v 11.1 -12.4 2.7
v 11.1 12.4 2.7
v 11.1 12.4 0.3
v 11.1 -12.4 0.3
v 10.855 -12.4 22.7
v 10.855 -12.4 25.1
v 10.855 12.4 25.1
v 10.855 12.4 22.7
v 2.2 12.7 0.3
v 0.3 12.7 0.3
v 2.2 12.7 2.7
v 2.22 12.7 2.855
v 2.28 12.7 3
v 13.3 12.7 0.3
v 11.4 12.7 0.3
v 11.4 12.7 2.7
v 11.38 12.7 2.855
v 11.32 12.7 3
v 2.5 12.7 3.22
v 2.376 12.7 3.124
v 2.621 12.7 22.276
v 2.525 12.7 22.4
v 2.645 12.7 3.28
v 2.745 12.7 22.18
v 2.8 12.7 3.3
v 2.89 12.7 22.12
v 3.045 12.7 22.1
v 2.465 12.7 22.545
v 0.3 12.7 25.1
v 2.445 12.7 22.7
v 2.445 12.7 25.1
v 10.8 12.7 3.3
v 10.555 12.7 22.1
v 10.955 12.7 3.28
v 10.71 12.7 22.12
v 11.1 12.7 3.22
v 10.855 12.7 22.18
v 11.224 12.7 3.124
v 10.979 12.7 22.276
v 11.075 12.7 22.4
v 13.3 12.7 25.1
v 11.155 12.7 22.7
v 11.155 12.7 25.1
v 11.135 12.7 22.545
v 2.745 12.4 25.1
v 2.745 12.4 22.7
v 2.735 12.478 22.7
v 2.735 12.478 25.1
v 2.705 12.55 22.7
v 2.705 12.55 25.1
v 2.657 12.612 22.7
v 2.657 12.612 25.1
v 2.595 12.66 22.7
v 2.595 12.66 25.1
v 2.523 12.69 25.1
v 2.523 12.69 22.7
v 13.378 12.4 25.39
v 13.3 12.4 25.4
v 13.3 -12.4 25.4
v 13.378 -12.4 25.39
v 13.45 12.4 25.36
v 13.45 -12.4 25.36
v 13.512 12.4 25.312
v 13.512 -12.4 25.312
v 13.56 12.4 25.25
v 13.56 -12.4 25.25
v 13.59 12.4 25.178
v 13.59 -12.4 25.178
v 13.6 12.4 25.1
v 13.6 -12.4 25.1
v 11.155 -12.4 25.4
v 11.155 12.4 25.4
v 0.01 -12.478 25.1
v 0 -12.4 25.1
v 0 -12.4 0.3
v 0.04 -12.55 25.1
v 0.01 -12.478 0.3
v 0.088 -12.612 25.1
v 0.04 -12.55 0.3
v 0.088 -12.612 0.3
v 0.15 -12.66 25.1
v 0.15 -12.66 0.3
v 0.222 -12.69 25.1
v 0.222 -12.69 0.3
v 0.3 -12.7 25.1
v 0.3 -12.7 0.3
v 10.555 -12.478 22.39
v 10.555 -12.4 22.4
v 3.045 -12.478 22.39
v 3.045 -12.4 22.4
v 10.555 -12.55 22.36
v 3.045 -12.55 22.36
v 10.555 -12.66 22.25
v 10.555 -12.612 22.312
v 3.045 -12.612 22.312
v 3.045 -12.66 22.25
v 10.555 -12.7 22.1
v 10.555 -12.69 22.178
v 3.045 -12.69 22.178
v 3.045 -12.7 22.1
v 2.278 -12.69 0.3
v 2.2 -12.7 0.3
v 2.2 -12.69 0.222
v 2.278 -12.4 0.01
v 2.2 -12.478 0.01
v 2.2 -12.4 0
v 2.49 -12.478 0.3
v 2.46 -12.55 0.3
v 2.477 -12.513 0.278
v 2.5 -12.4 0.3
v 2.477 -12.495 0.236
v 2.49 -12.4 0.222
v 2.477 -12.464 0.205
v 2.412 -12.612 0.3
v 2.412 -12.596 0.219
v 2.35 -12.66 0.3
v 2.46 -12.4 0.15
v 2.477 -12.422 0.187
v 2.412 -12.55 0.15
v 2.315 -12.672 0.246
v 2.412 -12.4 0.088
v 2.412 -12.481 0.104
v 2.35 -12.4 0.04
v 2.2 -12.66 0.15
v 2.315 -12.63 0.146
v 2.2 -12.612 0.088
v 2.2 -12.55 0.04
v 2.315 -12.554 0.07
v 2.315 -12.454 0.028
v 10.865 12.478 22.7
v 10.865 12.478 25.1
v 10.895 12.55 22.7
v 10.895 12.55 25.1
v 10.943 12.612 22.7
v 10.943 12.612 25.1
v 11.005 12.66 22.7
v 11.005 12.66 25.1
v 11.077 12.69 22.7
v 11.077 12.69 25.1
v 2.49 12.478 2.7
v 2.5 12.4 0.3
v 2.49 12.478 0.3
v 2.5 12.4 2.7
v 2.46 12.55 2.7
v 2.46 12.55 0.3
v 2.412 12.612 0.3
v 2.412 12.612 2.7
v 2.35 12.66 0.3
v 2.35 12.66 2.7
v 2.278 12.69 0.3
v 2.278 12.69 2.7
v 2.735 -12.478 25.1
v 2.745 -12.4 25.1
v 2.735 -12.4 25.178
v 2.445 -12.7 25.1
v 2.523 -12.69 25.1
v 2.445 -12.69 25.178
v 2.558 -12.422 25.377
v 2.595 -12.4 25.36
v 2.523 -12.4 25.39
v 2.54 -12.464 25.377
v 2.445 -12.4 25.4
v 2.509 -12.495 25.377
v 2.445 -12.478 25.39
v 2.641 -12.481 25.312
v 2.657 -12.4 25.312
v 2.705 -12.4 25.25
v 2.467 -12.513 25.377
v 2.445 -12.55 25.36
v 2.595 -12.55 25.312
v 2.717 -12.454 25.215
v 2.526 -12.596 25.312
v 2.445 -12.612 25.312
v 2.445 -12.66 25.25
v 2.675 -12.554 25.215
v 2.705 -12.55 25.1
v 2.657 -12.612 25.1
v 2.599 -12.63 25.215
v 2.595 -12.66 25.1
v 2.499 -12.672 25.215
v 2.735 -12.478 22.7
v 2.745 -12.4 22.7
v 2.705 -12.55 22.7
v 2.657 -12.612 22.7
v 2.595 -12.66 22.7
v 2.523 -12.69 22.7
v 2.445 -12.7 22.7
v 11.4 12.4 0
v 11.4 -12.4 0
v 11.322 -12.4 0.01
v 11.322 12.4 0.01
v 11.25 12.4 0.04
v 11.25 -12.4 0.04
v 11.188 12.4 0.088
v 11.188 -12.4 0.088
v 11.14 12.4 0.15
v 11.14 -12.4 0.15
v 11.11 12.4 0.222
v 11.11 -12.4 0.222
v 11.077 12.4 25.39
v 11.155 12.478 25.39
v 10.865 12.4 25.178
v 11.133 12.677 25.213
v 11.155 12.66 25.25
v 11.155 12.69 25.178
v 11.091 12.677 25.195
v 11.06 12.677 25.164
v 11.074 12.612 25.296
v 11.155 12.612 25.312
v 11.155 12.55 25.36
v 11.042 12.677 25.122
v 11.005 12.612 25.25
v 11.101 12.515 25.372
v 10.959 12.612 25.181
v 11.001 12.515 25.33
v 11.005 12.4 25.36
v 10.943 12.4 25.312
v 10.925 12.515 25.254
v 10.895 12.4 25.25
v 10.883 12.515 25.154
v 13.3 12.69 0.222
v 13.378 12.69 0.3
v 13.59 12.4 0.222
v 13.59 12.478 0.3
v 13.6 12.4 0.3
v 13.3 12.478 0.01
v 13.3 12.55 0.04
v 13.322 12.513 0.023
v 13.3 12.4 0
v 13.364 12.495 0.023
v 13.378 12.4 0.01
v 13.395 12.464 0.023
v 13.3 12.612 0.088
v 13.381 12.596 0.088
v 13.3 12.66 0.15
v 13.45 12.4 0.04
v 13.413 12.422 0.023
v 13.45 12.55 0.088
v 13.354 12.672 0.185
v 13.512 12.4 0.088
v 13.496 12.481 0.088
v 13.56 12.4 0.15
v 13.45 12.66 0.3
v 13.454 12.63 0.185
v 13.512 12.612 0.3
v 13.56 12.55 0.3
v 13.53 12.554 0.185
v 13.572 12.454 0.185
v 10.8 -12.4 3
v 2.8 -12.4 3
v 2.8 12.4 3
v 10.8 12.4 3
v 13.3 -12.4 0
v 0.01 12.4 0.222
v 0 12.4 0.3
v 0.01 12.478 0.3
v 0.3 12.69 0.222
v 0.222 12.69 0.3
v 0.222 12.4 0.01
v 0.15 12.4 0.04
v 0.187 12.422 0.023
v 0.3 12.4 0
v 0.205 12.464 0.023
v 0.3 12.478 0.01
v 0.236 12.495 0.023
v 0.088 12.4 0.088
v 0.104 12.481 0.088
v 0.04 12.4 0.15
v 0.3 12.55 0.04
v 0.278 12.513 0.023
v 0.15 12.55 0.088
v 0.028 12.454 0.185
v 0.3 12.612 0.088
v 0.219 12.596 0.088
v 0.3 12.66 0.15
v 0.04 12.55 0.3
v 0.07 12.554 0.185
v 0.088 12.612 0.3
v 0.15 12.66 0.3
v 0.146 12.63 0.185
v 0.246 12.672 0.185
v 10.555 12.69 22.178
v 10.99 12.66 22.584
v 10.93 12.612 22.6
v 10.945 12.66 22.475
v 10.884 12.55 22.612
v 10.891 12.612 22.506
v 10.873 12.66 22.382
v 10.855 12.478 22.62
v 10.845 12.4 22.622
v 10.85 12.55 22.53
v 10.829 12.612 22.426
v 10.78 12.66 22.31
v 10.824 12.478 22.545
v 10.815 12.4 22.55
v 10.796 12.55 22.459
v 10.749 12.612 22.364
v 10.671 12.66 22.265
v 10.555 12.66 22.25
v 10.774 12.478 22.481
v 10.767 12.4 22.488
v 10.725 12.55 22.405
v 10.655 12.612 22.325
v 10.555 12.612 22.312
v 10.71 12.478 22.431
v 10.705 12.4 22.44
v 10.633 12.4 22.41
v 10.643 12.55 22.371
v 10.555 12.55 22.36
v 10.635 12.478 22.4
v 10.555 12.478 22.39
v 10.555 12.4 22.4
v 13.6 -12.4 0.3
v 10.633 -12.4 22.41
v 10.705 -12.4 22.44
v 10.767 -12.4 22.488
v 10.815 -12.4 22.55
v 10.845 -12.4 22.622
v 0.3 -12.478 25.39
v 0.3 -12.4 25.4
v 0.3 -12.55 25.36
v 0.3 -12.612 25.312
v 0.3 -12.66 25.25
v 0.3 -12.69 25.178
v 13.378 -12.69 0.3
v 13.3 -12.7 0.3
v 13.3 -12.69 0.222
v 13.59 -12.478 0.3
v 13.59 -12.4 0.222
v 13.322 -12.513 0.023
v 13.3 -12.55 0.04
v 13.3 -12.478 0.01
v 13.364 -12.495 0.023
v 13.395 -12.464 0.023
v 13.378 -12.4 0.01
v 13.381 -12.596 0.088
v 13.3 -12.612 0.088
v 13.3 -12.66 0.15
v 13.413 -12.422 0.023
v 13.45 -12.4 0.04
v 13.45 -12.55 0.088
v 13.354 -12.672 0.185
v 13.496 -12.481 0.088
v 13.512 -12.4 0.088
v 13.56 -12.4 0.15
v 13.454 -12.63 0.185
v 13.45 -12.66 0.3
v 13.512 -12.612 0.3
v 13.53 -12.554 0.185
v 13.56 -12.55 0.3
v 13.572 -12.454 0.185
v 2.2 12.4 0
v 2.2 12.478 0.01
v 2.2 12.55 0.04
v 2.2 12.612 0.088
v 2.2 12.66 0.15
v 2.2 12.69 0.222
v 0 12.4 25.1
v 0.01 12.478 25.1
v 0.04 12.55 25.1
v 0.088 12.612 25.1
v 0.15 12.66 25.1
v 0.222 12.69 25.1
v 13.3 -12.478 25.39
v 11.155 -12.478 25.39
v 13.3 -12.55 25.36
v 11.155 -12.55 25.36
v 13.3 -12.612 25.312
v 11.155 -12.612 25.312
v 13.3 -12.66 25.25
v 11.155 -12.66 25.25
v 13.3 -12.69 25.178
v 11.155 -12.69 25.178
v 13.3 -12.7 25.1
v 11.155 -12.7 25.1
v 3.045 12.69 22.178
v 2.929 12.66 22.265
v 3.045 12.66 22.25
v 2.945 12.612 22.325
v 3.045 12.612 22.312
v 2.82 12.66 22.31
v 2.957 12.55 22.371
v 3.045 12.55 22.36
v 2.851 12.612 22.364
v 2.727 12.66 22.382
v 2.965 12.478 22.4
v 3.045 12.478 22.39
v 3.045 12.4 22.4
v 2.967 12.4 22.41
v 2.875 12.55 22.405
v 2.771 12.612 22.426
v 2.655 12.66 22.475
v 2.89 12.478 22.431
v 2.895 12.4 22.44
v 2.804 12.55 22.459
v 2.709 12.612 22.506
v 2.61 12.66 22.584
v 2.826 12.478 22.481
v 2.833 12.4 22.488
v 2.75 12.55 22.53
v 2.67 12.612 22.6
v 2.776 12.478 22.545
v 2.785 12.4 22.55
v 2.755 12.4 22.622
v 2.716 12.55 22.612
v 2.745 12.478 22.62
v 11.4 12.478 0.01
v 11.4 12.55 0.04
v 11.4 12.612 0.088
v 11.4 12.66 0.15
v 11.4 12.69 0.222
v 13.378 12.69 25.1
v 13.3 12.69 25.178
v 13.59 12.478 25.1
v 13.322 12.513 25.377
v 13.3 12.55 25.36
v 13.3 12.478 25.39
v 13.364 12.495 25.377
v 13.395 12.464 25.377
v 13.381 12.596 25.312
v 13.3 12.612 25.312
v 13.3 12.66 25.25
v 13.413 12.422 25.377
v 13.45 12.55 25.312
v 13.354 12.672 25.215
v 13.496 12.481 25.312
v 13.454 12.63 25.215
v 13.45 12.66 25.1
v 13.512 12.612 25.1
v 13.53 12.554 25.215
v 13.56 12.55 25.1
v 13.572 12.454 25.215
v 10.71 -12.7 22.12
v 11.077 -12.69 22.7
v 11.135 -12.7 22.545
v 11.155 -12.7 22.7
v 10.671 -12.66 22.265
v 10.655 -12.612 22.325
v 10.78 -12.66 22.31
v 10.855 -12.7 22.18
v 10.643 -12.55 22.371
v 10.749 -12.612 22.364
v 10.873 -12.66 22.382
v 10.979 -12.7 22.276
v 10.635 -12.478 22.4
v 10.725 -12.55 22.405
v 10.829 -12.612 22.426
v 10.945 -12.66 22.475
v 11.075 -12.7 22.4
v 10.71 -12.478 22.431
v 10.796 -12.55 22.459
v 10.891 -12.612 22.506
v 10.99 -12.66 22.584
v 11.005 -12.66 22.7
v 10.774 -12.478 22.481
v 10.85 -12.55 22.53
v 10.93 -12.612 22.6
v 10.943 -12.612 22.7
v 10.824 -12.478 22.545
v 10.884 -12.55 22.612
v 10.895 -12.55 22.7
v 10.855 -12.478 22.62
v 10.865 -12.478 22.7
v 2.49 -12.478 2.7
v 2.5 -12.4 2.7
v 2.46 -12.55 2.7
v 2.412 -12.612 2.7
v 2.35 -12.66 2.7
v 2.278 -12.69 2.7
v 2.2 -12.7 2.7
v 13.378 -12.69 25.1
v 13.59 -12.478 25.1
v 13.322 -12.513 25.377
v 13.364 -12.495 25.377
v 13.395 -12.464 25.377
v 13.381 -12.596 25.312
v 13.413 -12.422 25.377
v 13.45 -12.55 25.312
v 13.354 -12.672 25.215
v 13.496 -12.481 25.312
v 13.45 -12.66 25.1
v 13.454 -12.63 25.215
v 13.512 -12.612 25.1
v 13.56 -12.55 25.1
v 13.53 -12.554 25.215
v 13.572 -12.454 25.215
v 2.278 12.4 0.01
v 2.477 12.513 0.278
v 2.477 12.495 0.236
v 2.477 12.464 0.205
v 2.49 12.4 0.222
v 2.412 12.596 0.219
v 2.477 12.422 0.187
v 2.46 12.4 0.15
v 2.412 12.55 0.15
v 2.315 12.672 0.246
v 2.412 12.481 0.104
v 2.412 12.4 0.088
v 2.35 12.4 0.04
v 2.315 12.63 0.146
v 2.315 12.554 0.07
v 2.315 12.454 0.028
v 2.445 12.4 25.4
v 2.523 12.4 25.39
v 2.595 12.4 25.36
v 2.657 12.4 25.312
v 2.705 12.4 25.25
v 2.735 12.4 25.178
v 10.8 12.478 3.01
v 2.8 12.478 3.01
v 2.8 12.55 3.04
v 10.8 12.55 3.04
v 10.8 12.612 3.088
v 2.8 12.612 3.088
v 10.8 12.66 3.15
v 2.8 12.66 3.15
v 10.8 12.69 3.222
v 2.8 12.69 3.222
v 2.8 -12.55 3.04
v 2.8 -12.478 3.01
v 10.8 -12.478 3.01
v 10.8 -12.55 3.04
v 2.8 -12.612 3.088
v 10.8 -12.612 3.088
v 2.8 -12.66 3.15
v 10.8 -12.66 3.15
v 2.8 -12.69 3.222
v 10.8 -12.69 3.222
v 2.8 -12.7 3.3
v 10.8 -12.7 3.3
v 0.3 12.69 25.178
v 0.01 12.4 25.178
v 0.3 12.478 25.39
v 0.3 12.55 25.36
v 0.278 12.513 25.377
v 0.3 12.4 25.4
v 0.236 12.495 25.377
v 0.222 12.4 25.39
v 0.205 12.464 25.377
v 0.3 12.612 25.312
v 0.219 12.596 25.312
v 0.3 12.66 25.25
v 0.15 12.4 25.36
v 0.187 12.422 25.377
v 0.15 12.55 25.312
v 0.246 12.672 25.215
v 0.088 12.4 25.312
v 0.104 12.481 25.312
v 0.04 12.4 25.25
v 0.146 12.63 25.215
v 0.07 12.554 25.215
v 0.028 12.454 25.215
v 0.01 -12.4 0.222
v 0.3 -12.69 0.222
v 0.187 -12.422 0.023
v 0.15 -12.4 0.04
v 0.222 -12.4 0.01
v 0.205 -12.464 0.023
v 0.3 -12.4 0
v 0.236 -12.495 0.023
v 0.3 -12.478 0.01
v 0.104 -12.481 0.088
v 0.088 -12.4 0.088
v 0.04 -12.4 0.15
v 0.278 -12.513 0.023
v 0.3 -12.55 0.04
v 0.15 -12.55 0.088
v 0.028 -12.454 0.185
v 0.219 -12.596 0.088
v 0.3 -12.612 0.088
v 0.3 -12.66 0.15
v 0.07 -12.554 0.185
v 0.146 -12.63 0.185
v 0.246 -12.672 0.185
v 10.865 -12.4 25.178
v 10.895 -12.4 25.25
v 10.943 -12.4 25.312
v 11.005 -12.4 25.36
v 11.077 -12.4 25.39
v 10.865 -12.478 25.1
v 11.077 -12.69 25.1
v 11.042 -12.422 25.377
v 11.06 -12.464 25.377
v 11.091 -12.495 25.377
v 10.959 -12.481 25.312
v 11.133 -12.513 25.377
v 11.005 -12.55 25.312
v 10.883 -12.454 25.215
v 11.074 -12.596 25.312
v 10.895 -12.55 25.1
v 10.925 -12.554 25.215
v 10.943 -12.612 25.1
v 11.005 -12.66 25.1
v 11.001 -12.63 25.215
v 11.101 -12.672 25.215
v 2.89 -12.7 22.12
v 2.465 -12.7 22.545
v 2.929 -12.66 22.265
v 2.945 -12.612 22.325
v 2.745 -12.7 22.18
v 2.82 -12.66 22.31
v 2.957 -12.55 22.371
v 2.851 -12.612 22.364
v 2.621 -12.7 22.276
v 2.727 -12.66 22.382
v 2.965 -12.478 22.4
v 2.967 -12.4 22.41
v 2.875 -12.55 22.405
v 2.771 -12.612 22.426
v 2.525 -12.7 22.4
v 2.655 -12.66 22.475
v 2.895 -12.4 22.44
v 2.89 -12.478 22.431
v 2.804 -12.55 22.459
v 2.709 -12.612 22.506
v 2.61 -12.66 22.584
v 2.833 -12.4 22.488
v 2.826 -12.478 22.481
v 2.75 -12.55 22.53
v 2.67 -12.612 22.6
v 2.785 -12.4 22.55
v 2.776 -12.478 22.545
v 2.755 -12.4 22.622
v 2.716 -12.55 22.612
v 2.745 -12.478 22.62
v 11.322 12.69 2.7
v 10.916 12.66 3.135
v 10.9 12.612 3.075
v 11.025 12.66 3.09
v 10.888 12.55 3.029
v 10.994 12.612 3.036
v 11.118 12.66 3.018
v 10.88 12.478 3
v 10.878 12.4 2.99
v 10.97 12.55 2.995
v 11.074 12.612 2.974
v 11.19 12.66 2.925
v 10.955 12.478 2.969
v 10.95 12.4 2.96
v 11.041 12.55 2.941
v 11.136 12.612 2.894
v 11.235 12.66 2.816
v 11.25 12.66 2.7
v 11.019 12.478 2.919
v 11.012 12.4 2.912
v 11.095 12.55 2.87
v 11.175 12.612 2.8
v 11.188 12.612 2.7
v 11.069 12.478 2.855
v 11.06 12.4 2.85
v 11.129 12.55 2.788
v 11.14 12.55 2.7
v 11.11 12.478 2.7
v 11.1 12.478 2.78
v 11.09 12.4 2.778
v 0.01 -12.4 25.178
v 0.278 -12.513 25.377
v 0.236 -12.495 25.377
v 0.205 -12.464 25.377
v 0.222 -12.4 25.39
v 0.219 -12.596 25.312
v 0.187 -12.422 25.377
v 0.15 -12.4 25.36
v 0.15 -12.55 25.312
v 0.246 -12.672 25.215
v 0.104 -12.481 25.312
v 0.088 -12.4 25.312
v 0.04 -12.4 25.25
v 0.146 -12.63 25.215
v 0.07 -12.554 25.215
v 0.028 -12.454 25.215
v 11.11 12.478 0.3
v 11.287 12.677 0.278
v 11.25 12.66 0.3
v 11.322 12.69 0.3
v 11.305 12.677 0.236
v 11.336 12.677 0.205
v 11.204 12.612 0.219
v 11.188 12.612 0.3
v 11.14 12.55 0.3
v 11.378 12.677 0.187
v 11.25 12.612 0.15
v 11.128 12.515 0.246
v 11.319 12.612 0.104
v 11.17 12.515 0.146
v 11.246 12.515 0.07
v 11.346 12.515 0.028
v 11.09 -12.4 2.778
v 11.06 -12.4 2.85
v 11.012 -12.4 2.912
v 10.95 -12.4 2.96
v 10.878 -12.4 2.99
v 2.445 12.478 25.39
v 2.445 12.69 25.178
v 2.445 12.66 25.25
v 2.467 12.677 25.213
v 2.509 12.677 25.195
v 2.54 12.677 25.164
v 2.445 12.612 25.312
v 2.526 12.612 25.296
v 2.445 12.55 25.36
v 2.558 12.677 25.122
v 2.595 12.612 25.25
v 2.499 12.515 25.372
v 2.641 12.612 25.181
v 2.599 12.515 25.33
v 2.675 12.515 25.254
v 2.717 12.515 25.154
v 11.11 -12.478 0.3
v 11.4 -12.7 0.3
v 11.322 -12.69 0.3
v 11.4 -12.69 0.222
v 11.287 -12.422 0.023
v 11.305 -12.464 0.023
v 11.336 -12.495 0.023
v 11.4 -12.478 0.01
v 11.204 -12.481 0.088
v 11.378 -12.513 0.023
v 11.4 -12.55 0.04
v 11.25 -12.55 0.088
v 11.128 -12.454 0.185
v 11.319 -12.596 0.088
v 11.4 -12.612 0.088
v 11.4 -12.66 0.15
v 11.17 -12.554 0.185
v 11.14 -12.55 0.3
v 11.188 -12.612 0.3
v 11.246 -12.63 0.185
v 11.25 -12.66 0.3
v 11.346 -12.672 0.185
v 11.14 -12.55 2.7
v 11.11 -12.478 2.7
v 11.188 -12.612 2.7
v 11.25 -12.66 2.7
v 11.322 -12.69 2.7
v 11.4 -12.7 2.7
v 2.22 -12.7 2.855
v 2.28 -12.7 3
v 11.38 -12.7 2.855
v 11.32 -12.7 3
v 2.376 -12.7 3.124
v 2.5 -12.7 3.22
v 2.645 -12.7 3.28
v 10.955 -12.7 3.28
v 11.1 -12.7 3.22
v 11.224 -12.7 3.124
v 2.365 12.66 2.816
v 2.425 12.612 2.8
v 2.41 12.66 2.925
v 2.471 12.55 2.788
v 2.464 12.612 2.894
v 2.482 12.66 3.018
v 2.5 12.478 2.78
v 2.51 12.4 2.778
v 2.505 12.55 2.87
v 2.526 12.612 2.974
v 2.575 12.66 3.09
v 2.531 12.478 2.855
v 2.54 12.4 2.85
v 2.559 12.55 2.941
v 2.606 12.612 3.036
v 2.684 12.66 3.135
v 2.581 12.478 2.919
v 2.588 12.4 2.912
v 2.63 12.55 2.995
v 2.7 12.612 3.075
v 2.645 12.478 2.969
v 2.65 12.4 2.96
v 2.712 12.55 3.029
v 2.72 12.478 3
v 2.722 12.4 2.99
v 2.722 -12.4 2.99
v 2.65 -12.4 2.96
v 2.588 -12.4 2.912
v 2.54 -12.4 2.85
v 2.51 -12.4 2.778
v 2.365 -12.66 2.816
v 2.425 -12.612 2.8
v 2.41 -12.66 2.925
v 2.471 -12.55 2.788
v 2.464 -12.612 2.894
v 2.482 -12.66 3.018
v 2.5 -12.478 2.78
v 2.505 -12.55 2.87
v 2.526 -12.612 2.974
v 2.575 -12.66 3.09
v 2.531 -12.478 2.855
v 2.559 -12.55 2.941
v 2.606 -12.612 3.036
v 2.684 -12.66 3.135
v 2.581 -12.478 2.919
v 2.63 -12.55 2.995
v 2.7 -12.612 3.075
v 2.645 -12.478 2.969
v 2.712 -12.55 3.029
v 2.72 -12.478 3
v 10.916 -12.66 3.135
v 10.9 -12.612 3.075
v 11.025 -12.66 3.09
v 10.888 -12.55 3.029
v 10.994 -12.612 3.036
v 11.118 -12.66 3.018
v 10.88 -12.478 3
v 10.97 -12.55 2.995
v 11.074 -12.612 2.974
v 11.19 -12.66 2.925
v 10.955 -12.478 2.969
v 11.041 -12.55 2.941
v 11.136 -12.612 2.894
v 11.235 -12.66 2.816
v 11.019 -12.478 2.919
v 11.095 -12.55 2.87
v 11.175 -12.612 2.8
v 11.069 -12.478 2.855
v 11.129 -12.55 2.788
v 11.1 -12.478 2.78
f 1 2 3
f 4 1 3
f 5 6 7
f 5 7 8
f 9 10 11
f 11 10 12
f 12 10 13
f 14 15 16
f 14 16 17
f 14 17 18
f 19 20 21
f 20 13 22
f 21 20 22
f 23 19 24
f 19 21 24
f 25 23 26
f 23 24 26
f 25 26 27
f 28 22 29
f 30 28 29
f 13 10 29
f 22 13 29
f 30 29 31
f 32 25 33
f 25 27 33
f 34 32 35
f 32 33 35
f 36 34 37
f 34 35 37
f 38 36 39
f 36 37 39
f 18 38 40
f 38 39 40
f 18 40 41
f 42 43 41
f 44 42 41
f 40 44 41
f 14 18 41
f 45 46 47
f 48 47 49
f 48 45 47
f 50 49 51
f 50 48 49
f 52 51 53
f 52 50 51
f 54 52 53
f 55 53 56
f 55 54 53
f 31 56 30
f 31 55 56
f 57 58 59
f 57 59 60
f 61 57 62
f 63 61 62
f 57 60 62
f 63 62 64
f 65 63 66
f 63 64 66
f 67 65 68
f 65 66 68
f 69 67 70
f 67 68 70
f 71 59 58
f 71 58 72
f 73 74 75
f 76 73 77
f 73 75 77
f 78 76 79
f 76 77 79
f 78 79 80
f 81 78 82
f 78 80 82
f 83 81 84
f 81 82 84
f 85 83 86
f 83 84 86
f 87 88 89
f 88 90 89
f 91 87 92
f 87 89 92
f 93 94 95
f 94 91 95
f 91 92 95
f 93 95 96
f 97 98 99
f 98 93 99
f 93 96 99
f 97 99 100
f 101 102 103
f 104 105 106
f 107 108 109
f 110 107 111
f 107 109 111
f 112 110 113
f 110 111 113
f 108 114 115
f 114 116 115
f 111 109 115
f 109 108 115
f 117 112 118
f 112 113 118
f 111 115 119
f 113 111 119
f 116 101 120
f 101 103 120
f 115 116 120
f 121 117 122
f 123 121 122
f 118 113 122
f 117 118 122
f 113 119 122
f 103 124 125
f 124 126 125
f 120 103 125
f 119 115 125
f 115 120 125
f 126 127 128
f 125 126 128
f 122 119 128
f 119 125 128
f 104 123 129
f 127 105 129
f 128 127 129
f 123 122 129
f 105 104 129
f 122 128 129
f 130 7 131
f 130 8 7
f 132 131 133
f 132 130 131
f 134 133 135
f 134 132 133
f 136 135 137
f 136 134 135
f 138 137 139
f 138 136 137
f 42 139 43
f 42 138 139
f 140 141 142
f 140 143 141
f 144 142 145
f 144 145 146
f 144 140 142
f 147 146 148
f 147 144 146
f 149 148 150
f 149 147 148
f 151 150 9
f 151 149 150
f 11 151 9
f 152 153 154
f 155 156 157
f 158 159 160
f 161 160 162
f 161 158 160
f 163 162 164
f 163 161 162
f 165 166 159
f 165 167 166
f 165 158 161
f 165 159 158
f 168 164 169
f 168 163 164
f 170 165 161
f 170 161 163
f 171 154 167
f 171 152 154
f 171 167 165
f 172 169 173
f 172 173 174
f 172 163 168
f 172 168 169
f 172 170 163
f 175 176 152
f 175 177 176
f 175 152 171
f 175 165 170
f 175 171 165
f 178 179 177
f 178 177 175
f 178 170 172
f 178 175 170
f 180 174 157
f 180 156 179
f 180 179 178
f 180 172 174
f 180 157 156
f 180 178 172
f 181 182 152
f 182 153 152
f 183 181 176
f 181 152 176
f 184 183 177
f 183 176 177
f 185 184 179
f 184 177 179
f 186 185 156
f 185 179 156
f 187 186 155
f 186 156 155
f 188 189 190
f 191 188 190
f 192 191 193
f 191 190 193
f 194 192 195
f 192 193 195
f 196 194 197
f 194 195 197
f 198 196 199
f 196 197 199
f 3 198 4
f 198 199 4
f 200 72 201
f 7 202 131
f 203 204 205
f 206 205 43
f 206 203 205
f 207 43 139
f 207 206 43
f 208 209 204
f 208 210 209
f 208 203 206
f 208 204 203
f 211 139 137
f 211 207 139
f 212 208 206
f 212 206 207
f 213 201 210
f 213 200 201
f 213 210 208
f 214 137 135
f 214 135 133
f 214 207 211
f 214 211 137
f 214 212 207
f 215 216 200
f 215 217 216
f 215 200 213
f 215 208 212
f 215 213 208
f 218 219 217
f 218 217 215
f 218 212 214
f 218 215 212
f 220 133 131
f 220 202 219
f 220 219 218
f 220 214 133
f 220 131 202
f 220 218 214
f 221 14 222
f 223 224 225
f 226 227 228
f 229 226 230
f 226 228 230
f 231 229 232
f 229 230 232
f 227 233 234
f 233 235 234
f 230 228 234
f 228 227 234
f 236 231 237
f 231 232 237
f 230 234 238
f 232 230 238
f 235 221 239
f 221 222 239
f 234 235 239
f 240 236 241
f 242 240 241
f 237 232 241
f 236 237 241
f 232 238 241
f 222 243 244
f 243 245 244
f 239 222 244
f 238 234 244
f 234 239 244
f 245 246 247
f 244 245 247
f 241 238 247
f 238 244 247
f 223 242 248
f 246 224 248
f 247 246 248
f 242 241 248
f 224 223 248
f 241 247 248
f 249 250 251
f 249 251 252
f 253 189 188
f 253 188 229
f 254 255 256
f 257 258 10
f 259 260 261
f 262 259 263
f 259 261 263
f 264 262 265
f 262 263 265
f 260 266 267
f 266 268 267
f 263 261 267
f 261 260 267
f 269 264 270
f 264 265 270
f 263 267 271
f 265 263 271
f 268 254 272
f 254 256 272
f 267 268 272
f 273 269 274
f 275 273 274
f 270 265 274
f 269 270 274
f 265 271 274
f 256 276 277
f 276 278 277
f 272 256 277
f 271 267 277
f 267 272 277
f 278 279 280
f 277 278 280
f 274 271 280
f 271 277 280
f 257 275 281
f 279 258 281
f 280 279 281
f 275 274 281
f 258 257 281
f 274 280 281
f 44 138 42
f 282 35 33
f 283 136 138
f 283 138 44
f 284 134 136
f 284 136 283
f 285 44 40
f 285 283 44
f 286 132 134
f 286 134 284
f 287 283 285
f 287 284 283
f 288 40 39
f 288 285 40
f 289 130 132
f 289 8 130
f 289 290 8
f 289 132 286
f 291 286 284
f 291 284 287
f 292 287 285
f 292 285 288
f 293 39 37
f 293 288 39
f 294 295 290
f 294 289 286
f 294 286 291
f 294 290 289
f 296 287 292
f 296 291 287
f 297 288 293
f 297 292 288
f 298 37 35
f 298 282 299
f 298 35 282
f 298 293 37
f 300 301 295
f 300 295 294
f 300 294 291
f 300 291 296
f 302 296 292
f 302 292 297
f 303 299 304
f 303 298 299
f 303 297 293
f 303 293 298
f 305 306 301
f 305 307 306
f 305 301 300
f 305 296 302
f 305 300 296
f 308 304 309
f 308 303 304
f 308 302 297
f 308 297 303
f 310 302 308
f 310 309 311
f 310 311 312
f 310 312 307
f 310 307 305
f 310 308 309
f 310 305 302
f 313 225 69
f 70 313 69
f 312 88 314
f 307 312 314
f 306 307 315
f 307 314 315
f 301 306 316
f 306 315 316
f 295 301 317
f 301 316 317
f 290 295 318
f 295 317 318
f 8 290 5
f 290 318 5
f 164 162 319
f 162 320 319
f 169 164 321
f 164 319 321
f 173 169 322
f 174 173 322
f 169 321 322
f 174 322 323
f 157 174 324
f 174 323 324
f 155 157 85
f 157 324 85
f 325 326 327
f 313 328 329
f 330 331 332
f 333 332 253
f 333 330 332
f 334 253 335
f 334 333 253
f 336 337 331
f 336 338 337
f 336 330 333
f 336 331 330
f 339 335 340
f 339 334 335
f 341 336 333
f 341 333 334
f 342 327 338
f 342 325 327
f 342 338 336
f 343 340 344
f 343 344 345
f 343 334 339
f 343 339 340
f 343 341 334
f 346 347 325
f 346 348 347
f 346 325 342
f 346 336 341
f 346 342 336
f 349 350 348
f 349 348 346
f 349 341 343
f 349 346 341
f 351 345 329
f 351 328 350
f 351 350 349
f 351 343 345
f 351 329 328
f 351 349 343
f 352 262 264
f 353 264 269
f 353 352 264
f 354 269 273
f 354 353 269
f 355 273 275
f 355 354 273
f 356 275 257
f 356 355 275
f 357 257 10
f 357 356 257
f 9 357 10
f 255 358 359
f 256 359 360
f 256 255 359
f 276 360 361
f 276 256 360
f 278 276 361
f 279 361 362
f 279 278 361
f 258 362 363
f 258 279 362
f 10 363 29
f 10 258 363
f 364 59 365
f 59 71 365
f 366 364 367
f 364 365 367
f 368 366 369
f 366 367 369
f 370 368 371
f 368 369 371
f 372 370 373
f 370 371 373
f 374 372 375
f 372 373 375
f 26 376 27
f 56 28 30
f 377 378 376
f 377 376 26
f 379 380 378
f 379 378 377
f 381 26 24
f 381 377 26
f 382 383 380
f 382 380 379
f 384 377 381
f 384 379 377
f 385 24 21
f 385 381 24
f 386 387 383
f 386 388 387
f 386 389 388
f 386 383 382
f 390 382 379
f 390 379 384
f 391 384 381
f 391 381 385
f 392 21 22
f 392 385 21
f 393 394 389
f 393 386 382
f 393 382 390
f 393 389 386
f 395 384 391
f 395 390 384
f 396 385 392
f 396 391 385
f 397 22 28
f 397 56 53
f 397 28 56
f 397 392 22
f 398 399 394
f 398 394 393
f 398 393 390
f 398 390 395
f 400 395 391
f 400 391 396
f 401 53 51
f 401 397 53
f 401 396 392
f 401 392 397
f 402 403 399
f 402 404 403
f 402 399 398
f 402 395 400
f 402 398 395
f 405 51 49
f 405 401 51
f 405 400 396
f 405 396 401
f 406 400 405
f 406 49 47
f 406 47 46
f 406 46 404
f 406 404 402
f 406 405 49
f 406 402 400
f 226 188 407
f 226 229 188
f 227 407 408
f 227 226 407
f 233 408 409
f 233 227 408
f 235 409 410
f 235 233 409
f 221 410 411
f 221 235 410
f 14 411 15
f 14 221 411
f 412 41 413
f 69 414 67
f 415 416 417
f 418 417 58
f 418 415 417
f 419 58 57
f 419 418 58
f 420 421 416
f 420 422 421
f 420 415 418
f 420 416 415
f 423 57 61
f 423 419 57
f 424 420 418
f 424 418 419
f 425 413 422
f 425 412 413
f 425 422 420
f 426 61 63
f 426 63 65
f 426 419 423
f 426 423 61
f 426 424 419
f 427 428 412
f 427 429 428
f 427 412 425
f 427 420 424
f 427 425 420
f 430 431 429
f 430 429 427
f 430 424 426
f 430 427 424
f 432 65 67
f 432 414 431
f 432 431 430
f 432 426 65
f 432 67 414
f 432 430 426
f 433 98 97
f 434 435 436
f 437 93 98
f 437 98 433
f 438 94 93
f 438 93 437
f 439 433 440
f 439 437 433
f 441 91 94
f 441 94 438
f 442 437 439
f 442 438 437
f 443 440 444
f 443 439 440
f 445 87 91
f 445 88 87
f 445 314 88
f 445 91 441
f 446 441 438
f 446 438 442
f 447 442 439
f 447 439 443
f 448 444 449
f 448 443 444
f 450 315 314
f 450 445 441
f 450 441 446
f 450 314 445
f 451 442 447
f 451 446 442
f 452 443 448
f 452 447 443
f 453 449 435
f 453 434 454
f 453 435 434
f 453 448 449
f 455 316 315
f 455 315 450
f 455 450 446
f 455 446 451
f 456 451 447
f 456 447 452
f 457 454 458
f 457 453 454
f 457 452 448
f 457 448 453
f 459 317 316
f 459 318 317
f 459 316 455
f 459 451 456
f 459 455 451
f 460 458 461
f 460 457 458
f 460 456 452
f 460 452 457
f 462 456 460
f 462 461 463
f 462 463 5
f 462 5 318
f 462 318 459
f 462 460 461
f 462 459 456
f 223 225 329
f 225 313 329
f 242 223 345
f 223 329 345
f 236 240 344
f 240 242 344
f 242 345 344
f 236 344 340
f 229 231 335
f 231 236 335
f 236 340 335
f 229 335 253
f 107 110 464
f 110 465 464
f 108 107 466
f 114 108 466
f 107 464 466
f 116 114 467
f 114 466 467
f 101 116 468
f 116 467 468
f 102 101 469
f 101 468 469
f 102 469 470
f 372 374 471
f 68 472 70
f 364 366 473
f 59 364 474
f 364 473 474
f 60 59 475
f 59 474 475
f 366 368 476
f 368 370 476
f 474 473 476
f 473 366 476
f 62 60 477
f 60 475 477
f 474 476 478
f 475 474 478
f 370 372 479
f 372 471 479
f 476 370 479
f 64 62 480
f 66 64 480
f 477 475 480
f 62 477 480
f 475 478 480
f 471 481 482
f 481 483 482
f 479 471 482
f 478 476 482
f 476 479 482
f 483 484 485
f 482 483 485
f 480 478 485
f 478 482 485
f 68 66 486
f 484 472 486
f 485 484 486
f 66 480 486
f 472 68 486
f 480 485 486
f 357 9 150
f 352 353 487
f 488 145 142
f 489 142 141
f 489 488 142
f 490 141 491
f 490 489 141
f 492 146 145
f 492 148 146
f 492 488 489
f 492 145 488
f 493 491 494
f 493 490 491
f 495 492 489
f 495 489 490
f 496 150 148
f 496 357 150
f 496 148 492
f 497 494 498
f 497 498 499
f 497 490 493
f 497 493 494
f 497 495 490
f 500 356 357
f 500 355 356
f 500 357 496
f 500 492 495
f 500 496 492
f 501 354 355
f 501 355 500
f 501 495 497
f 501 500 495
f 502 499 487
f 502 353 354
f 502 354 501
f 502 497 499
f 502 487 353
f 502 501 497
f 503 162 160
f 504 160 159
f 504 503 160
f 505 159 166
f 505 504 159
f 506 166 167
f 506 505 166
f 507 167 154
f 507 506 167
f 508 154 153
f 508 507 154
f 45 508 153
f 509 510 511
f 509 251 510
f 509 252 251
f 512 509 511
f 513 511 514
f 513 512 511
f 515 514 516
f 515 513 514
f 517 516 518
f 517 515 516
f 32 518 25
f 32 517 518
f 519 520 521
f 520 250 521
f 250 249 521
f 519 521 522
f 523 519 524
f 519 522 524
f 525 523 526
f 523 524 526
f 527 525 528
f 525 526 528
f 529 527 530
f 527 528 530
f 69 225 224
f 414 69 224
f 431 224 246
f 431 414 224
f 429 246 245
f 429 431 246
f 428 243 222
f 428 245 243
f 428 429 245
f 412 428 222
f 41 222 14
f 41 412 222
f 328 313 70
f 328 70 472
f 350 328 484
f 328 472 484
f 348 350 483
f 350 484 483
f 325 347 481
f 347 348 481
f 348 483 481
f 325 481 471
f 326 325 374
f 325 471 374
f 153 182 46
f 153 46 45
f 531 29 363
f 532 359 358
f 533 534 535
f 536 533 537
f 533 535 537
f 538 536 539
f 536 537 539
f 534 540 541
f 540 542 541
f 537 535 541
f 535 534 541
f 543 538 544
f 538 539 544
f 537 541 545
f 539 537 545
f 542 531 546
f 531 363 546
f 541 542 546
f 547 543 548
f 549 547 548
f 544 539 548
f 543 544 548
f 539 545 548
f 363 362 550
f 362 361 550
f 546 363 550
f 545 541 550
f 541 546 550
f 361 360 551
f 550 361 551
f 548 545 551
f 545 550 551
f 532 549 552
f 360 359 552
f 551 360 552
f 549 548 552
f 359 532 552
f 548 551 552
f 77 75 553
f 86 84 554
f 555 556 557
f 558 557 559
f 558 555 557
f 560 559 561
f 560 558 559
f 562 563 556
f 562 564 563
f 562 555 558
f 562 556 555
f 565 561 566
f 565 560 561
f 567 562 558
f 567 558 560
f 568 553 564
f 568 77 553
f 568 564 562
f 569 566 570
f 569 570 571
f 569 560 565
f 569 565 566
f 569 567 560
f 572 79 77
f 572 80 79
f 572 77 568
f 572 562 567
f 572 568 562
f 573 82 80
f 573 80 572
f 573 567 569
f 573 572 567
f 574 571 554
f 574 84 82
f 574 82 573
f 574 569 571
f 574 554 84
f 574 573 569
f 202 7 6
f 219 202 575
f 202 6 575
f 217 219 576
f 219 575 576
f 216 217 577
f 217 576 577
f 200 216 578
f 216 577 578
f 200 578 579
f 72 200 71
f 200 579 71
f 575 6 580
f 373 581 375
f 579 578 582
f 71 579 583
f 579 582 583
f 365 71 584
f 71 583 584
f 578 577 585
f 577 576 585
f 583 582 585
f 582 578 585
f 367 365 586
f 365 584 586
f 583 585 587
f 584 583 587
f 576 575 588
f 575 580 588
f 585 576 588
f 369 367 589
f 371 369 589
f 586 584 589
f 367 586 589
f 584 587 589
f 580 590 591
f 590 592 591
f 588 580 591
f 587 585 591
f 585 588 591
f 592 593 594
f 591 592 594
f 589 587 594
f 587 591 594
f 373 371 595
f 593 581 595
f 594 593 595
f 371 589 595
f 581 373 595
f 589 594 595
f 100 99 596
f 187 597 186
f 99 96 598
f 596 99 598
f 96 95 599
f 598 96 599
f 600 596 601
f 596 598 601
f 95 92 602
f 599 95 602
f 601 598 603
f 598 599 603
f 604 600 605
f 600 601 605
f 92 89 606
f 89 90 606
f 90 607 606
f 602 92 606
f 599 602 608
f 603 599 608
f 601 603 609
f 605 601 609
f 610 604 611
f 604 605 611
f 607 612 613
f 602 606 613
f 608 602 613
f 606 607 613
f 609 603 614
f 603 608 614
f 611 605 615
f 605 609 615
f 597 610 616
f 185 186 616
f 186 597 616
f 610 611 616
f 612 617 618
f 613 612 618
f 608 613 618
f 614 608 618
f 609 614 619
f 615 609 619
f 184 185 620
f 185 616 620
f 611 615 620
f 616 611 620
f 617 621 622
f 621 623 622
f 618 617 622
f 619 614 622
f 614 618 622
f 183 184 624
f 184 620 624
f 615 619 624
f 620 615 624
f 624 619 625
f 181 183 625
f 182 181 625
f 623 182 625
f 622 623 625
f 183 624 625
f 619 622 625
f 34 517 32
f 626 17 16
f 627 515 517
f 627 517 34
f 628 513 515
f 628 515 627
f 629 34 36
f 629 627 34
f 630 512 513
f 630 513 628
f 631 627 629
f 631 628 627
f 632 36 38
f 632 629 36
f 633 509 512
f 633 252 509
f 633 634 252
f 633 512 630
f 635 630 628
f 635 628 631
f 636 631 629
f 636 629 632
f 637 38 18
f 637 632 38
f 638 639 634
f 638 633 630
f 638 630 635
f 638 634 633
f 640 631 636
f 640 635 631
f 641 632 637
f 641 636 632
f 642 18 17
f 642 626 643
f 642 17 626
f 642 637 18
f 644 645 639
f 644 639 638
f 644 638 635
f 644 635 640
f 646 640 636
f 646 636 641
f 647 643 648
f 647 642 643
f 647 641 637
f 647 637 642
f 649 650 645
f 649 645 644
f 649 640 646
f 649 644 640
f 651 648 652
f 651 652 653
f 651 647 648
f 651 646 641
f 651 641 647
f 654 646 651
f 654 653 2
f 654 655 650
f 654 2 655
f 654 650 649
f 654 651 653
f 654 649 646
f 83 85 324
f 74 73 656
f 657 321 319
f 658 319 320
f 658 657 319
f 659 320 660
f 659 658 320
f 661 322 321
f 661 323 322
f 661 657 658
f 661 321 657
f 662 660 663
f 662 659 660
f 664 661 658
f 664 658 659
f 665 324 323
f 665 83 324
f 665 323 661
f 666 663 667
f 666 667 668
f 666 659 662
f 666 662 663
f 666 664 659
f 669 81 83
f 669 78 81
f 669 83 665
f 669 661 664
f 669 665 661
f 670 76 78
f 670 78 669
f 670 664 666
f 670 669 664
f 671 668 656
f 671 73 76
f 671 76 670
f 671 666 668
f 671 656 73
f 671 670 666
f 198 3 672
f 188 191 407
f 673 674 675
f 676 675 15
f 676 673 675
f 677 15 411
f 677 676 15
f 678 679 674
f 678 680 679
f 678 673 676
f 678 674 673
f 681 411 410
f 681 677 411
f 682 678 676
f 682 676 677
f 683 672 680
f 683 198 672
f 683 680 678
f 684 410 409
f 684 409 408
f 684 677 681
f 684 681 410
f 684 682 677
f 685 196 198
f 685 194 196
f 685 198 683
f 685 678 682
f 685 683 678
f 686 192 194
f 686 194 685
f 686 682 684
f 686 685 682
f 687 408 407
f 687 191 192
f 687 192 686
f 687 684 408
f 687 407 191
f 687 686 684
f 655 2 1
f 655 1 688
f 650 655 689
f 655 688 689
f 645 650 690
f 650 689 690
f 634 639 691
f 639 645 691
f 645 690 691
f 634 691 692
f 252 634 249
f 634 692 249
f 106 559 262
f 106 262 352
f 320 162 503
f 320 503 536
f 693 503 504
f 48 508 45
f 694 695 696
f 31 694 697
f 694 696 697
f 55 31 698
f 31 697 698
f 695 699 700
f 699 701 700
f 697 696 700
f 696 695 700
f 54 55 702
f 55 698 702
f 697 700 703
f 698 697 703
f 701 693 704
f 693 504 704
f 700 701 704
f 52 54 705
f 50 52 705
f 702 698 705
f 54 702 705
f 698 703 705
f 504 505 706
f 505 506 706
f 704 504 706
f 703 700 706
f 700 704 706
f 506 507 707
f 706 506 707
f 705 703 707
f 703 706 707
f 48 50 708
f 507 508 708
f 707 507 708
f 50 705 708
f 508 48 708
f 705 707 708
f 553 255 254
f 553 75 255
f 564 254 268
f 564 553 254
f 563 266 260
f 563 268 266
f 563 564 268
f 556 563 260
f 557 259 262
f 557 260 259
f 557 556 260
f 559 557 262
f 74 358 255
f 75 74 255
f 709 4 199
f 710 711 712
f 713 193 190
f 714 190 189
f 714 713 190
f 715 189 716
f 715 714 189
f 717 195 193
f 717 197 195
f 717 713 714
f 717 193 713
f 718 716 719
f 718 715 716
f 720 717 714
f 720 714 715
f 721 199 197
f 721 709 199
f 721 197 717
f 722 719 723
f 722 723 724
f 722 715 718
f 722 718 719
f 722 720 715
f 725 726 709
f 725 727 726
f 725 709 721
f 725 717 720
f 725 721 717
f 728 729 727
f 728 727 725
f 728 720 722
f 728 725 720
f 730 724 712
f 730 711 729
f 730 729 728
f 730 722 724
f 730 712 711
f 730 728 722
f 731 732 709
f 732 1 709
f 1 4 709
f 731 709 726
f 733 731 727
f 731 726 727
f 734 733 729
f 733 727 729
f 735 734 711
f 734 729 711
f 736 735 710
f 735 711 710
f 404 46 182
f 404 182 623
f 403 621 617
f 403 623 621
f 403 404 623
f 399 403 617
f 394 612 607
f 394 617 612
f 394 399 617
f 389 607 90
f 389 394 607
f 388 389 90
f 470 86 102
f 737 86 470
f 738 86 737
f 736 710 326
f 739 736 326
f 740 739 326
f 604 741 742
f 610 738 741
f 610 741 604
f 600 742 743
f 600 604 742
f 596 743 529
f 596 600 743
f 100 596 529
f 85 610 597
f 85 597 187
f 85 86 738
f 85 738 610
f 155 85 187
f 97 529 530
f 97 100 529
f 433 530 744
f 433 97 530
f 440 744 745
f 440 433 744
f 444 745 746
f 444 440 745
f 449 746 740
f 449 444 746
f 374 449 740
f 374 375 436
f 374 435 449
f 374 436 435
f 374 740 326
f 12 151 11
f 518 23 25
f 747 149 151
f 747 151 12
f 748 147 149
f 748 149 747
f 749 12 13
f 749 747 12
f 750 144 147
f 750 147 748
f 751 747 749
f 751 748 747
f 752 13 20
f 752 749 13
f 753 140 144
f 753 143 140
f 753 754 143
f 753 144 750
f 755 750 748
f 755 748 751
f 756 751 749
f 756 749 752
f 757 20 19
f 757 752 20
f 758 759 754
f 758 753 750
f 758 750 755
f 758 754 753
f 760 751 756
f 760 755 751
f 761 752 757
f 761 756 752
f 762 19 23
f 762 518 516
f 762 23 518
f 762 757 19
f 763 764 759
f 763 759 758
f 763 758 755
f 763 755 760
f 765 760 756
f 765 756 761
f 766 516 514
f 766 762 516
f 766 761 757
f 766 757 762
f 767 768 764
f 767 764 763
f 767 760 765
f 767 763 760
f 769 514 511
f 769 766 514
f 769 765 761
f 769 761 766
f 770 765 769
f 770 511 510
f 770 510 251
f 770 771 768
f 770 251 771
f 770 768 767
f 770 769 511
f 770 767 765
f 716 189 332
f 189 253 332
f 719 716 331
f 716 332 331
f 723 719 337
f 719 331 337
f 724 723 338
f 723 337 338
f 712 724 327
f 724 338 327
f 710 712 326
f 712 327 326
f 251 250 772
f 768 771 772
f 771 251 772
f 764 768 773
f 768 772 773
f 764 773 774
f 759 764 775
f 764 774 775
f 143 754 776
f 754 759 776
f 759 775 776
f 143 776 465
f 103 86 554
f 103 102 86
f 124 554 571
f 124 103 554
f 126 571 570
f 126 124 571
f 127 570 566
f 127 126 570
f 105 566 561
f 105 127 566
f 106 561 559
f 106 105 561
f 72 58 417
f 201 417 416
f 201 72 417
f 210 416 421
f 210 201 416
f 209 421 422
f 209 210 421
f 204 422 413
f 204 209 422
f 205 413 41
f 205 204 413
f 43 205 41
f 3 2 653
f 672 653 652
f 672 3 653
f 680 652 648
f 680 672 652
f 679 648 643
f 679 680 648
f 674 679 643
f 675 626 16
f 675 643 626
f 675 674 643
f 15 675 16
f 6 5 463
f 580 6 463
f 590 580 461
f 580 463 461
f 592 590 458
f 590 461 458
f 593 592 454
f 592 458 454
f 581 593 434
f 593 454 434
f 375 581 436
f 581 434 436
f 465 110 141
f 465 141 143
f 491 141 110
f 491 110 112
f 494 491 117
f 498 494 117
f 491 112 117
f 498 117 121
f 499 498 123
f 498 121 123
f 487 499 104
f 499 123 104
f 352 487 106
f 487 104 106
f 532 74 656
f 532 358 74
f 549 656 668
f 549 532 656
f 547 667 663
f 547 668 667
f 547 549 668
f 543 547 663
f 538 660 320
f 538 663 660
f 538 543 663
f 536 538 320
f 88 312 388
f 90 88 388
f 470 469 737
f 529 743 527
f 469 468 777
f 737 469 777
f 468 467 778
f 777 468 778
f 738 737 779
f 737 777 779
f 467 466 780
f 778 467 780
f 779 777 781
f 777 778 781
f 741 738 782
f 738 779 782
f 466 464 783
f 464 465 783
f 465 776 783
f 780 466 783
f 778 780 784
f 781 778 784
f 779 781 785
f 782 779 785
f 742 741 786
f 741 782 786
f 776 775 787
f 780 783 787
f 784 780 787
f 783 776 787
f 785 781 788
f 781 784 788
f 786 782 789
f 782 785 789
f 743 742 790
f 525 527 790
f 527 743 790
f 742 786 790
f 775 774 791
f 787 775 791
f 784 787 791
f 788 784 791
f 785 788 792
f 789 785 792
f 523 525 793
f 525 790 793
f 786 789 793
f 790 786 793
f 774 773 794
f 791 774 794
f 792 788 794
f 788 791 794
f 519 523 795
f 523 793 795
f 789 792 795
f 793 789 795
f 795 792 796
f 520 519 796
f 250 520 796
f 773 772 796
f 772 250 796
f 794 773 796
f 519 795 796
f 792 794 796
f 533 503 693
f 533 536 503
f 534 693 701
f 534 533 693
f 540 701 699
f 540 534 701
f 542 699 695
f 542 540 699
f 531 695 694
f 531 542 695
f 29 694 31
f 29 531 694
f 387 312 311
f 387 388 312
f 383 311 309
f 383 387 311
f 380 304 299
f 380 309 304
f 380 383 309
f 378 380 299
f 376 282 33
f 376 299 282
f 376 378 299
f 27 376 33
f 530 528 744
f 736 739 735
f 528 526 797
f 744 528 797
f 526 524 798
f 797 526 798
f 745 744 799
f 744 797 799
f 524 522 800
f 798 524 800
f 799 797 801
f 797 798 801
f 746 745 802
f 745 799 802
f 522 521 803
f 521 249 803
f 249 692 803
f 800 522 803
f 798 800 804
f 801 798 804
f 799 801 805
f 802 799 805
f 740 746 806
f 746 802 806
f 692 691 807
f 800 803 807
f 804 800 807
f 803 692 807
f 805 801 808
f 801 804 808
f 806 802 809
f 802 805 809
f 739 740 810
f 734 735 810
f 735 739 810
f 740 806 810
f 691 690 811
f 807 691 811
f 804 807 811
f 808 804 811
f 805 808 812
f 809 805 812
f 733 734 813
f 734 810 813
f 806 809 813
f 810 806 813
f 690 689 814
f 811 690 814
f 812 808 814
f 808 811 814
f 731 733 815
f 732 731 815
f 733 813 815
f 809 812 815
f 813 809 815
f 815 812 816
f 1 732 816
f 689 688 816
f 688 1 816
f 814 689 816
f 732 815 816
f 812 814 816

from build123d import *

# Parameters (mm, degrees)
F1_DEPTH = 12.7
F2_R     = 0.3


# Not quite as in the source:
# - a feature names something its author has since deleted; it is built from what else it names


with BuildPart() as f1:
    # F0 (on Front) → F1 (new body, symmetric)
    with BuildSketch(Plane.XZ):
        Polygon((0, 25.4), (0, 0), (2.5, 0), (2.5, 3), (11.1, 3), (11.1, 0), (13.6, 0), (13.6, 25.4), (10.855, 25.4), (10.855, 22.4), (2.745, 22.4), (2.745, 25.4), align=None)
    extrude(amount=F1_DEPTH, both=True)

    # F2
    f2_edges = [f1.edges().sort_by_distance(p)[0] for p in [
        (0, 12.7, 12.7),
        (0, -12.7, 12.7),
        (0, 0, 0),
        (1.25, -12.7, 0),
        (13.6, -12.7, 12.7),
        (13.6, 12.7, 12.7),
        (1.25, 12.7, 0),
        (6.8, -12.7, 22.4),
        (2.745, -12.7, 23.9),
        (2.745, 0, 25.4),
        (10.855, -12.7, 23.9),
        (10.855, 0, 25.4),
        (2.745, 0, 22.4),
        (6.8, 12.7, 22.4),
        (10.855, 0, 22.4),
        (2.5, 0, 3),
        (2.5, -12.7, 1.5),
        (6.8, -12.7, 3),
        (11.1, -12.7, 1.5),
        (11.1, 0, 0),
        (12.35, -12.7, 0),
        (2.5, 12.7, 1.5),
        (6.8, 12.7, 3),
        (11.1, 12.7, 1.5),
        (11.1, 0, 3),
        (12.2275, -12.7, 25.4),
        (1.3725, -12.7, 25.4),
        (1.3725, 12.7, 25.4),
        (12.2275, 12.7, 25.4),
        (12.35, 12.7, 0),
        (0, 0, 25.4),
        (2.745, 12.7, 23.9),
        (10.855, 12.7, 23.9),
        (13.6, 0, 25.4),
        (13.6, 0, 0),
        (2.5, 0, 0),
    ]]
    fillet(f2_edges, radius=F2_R)


solid = f1.part
